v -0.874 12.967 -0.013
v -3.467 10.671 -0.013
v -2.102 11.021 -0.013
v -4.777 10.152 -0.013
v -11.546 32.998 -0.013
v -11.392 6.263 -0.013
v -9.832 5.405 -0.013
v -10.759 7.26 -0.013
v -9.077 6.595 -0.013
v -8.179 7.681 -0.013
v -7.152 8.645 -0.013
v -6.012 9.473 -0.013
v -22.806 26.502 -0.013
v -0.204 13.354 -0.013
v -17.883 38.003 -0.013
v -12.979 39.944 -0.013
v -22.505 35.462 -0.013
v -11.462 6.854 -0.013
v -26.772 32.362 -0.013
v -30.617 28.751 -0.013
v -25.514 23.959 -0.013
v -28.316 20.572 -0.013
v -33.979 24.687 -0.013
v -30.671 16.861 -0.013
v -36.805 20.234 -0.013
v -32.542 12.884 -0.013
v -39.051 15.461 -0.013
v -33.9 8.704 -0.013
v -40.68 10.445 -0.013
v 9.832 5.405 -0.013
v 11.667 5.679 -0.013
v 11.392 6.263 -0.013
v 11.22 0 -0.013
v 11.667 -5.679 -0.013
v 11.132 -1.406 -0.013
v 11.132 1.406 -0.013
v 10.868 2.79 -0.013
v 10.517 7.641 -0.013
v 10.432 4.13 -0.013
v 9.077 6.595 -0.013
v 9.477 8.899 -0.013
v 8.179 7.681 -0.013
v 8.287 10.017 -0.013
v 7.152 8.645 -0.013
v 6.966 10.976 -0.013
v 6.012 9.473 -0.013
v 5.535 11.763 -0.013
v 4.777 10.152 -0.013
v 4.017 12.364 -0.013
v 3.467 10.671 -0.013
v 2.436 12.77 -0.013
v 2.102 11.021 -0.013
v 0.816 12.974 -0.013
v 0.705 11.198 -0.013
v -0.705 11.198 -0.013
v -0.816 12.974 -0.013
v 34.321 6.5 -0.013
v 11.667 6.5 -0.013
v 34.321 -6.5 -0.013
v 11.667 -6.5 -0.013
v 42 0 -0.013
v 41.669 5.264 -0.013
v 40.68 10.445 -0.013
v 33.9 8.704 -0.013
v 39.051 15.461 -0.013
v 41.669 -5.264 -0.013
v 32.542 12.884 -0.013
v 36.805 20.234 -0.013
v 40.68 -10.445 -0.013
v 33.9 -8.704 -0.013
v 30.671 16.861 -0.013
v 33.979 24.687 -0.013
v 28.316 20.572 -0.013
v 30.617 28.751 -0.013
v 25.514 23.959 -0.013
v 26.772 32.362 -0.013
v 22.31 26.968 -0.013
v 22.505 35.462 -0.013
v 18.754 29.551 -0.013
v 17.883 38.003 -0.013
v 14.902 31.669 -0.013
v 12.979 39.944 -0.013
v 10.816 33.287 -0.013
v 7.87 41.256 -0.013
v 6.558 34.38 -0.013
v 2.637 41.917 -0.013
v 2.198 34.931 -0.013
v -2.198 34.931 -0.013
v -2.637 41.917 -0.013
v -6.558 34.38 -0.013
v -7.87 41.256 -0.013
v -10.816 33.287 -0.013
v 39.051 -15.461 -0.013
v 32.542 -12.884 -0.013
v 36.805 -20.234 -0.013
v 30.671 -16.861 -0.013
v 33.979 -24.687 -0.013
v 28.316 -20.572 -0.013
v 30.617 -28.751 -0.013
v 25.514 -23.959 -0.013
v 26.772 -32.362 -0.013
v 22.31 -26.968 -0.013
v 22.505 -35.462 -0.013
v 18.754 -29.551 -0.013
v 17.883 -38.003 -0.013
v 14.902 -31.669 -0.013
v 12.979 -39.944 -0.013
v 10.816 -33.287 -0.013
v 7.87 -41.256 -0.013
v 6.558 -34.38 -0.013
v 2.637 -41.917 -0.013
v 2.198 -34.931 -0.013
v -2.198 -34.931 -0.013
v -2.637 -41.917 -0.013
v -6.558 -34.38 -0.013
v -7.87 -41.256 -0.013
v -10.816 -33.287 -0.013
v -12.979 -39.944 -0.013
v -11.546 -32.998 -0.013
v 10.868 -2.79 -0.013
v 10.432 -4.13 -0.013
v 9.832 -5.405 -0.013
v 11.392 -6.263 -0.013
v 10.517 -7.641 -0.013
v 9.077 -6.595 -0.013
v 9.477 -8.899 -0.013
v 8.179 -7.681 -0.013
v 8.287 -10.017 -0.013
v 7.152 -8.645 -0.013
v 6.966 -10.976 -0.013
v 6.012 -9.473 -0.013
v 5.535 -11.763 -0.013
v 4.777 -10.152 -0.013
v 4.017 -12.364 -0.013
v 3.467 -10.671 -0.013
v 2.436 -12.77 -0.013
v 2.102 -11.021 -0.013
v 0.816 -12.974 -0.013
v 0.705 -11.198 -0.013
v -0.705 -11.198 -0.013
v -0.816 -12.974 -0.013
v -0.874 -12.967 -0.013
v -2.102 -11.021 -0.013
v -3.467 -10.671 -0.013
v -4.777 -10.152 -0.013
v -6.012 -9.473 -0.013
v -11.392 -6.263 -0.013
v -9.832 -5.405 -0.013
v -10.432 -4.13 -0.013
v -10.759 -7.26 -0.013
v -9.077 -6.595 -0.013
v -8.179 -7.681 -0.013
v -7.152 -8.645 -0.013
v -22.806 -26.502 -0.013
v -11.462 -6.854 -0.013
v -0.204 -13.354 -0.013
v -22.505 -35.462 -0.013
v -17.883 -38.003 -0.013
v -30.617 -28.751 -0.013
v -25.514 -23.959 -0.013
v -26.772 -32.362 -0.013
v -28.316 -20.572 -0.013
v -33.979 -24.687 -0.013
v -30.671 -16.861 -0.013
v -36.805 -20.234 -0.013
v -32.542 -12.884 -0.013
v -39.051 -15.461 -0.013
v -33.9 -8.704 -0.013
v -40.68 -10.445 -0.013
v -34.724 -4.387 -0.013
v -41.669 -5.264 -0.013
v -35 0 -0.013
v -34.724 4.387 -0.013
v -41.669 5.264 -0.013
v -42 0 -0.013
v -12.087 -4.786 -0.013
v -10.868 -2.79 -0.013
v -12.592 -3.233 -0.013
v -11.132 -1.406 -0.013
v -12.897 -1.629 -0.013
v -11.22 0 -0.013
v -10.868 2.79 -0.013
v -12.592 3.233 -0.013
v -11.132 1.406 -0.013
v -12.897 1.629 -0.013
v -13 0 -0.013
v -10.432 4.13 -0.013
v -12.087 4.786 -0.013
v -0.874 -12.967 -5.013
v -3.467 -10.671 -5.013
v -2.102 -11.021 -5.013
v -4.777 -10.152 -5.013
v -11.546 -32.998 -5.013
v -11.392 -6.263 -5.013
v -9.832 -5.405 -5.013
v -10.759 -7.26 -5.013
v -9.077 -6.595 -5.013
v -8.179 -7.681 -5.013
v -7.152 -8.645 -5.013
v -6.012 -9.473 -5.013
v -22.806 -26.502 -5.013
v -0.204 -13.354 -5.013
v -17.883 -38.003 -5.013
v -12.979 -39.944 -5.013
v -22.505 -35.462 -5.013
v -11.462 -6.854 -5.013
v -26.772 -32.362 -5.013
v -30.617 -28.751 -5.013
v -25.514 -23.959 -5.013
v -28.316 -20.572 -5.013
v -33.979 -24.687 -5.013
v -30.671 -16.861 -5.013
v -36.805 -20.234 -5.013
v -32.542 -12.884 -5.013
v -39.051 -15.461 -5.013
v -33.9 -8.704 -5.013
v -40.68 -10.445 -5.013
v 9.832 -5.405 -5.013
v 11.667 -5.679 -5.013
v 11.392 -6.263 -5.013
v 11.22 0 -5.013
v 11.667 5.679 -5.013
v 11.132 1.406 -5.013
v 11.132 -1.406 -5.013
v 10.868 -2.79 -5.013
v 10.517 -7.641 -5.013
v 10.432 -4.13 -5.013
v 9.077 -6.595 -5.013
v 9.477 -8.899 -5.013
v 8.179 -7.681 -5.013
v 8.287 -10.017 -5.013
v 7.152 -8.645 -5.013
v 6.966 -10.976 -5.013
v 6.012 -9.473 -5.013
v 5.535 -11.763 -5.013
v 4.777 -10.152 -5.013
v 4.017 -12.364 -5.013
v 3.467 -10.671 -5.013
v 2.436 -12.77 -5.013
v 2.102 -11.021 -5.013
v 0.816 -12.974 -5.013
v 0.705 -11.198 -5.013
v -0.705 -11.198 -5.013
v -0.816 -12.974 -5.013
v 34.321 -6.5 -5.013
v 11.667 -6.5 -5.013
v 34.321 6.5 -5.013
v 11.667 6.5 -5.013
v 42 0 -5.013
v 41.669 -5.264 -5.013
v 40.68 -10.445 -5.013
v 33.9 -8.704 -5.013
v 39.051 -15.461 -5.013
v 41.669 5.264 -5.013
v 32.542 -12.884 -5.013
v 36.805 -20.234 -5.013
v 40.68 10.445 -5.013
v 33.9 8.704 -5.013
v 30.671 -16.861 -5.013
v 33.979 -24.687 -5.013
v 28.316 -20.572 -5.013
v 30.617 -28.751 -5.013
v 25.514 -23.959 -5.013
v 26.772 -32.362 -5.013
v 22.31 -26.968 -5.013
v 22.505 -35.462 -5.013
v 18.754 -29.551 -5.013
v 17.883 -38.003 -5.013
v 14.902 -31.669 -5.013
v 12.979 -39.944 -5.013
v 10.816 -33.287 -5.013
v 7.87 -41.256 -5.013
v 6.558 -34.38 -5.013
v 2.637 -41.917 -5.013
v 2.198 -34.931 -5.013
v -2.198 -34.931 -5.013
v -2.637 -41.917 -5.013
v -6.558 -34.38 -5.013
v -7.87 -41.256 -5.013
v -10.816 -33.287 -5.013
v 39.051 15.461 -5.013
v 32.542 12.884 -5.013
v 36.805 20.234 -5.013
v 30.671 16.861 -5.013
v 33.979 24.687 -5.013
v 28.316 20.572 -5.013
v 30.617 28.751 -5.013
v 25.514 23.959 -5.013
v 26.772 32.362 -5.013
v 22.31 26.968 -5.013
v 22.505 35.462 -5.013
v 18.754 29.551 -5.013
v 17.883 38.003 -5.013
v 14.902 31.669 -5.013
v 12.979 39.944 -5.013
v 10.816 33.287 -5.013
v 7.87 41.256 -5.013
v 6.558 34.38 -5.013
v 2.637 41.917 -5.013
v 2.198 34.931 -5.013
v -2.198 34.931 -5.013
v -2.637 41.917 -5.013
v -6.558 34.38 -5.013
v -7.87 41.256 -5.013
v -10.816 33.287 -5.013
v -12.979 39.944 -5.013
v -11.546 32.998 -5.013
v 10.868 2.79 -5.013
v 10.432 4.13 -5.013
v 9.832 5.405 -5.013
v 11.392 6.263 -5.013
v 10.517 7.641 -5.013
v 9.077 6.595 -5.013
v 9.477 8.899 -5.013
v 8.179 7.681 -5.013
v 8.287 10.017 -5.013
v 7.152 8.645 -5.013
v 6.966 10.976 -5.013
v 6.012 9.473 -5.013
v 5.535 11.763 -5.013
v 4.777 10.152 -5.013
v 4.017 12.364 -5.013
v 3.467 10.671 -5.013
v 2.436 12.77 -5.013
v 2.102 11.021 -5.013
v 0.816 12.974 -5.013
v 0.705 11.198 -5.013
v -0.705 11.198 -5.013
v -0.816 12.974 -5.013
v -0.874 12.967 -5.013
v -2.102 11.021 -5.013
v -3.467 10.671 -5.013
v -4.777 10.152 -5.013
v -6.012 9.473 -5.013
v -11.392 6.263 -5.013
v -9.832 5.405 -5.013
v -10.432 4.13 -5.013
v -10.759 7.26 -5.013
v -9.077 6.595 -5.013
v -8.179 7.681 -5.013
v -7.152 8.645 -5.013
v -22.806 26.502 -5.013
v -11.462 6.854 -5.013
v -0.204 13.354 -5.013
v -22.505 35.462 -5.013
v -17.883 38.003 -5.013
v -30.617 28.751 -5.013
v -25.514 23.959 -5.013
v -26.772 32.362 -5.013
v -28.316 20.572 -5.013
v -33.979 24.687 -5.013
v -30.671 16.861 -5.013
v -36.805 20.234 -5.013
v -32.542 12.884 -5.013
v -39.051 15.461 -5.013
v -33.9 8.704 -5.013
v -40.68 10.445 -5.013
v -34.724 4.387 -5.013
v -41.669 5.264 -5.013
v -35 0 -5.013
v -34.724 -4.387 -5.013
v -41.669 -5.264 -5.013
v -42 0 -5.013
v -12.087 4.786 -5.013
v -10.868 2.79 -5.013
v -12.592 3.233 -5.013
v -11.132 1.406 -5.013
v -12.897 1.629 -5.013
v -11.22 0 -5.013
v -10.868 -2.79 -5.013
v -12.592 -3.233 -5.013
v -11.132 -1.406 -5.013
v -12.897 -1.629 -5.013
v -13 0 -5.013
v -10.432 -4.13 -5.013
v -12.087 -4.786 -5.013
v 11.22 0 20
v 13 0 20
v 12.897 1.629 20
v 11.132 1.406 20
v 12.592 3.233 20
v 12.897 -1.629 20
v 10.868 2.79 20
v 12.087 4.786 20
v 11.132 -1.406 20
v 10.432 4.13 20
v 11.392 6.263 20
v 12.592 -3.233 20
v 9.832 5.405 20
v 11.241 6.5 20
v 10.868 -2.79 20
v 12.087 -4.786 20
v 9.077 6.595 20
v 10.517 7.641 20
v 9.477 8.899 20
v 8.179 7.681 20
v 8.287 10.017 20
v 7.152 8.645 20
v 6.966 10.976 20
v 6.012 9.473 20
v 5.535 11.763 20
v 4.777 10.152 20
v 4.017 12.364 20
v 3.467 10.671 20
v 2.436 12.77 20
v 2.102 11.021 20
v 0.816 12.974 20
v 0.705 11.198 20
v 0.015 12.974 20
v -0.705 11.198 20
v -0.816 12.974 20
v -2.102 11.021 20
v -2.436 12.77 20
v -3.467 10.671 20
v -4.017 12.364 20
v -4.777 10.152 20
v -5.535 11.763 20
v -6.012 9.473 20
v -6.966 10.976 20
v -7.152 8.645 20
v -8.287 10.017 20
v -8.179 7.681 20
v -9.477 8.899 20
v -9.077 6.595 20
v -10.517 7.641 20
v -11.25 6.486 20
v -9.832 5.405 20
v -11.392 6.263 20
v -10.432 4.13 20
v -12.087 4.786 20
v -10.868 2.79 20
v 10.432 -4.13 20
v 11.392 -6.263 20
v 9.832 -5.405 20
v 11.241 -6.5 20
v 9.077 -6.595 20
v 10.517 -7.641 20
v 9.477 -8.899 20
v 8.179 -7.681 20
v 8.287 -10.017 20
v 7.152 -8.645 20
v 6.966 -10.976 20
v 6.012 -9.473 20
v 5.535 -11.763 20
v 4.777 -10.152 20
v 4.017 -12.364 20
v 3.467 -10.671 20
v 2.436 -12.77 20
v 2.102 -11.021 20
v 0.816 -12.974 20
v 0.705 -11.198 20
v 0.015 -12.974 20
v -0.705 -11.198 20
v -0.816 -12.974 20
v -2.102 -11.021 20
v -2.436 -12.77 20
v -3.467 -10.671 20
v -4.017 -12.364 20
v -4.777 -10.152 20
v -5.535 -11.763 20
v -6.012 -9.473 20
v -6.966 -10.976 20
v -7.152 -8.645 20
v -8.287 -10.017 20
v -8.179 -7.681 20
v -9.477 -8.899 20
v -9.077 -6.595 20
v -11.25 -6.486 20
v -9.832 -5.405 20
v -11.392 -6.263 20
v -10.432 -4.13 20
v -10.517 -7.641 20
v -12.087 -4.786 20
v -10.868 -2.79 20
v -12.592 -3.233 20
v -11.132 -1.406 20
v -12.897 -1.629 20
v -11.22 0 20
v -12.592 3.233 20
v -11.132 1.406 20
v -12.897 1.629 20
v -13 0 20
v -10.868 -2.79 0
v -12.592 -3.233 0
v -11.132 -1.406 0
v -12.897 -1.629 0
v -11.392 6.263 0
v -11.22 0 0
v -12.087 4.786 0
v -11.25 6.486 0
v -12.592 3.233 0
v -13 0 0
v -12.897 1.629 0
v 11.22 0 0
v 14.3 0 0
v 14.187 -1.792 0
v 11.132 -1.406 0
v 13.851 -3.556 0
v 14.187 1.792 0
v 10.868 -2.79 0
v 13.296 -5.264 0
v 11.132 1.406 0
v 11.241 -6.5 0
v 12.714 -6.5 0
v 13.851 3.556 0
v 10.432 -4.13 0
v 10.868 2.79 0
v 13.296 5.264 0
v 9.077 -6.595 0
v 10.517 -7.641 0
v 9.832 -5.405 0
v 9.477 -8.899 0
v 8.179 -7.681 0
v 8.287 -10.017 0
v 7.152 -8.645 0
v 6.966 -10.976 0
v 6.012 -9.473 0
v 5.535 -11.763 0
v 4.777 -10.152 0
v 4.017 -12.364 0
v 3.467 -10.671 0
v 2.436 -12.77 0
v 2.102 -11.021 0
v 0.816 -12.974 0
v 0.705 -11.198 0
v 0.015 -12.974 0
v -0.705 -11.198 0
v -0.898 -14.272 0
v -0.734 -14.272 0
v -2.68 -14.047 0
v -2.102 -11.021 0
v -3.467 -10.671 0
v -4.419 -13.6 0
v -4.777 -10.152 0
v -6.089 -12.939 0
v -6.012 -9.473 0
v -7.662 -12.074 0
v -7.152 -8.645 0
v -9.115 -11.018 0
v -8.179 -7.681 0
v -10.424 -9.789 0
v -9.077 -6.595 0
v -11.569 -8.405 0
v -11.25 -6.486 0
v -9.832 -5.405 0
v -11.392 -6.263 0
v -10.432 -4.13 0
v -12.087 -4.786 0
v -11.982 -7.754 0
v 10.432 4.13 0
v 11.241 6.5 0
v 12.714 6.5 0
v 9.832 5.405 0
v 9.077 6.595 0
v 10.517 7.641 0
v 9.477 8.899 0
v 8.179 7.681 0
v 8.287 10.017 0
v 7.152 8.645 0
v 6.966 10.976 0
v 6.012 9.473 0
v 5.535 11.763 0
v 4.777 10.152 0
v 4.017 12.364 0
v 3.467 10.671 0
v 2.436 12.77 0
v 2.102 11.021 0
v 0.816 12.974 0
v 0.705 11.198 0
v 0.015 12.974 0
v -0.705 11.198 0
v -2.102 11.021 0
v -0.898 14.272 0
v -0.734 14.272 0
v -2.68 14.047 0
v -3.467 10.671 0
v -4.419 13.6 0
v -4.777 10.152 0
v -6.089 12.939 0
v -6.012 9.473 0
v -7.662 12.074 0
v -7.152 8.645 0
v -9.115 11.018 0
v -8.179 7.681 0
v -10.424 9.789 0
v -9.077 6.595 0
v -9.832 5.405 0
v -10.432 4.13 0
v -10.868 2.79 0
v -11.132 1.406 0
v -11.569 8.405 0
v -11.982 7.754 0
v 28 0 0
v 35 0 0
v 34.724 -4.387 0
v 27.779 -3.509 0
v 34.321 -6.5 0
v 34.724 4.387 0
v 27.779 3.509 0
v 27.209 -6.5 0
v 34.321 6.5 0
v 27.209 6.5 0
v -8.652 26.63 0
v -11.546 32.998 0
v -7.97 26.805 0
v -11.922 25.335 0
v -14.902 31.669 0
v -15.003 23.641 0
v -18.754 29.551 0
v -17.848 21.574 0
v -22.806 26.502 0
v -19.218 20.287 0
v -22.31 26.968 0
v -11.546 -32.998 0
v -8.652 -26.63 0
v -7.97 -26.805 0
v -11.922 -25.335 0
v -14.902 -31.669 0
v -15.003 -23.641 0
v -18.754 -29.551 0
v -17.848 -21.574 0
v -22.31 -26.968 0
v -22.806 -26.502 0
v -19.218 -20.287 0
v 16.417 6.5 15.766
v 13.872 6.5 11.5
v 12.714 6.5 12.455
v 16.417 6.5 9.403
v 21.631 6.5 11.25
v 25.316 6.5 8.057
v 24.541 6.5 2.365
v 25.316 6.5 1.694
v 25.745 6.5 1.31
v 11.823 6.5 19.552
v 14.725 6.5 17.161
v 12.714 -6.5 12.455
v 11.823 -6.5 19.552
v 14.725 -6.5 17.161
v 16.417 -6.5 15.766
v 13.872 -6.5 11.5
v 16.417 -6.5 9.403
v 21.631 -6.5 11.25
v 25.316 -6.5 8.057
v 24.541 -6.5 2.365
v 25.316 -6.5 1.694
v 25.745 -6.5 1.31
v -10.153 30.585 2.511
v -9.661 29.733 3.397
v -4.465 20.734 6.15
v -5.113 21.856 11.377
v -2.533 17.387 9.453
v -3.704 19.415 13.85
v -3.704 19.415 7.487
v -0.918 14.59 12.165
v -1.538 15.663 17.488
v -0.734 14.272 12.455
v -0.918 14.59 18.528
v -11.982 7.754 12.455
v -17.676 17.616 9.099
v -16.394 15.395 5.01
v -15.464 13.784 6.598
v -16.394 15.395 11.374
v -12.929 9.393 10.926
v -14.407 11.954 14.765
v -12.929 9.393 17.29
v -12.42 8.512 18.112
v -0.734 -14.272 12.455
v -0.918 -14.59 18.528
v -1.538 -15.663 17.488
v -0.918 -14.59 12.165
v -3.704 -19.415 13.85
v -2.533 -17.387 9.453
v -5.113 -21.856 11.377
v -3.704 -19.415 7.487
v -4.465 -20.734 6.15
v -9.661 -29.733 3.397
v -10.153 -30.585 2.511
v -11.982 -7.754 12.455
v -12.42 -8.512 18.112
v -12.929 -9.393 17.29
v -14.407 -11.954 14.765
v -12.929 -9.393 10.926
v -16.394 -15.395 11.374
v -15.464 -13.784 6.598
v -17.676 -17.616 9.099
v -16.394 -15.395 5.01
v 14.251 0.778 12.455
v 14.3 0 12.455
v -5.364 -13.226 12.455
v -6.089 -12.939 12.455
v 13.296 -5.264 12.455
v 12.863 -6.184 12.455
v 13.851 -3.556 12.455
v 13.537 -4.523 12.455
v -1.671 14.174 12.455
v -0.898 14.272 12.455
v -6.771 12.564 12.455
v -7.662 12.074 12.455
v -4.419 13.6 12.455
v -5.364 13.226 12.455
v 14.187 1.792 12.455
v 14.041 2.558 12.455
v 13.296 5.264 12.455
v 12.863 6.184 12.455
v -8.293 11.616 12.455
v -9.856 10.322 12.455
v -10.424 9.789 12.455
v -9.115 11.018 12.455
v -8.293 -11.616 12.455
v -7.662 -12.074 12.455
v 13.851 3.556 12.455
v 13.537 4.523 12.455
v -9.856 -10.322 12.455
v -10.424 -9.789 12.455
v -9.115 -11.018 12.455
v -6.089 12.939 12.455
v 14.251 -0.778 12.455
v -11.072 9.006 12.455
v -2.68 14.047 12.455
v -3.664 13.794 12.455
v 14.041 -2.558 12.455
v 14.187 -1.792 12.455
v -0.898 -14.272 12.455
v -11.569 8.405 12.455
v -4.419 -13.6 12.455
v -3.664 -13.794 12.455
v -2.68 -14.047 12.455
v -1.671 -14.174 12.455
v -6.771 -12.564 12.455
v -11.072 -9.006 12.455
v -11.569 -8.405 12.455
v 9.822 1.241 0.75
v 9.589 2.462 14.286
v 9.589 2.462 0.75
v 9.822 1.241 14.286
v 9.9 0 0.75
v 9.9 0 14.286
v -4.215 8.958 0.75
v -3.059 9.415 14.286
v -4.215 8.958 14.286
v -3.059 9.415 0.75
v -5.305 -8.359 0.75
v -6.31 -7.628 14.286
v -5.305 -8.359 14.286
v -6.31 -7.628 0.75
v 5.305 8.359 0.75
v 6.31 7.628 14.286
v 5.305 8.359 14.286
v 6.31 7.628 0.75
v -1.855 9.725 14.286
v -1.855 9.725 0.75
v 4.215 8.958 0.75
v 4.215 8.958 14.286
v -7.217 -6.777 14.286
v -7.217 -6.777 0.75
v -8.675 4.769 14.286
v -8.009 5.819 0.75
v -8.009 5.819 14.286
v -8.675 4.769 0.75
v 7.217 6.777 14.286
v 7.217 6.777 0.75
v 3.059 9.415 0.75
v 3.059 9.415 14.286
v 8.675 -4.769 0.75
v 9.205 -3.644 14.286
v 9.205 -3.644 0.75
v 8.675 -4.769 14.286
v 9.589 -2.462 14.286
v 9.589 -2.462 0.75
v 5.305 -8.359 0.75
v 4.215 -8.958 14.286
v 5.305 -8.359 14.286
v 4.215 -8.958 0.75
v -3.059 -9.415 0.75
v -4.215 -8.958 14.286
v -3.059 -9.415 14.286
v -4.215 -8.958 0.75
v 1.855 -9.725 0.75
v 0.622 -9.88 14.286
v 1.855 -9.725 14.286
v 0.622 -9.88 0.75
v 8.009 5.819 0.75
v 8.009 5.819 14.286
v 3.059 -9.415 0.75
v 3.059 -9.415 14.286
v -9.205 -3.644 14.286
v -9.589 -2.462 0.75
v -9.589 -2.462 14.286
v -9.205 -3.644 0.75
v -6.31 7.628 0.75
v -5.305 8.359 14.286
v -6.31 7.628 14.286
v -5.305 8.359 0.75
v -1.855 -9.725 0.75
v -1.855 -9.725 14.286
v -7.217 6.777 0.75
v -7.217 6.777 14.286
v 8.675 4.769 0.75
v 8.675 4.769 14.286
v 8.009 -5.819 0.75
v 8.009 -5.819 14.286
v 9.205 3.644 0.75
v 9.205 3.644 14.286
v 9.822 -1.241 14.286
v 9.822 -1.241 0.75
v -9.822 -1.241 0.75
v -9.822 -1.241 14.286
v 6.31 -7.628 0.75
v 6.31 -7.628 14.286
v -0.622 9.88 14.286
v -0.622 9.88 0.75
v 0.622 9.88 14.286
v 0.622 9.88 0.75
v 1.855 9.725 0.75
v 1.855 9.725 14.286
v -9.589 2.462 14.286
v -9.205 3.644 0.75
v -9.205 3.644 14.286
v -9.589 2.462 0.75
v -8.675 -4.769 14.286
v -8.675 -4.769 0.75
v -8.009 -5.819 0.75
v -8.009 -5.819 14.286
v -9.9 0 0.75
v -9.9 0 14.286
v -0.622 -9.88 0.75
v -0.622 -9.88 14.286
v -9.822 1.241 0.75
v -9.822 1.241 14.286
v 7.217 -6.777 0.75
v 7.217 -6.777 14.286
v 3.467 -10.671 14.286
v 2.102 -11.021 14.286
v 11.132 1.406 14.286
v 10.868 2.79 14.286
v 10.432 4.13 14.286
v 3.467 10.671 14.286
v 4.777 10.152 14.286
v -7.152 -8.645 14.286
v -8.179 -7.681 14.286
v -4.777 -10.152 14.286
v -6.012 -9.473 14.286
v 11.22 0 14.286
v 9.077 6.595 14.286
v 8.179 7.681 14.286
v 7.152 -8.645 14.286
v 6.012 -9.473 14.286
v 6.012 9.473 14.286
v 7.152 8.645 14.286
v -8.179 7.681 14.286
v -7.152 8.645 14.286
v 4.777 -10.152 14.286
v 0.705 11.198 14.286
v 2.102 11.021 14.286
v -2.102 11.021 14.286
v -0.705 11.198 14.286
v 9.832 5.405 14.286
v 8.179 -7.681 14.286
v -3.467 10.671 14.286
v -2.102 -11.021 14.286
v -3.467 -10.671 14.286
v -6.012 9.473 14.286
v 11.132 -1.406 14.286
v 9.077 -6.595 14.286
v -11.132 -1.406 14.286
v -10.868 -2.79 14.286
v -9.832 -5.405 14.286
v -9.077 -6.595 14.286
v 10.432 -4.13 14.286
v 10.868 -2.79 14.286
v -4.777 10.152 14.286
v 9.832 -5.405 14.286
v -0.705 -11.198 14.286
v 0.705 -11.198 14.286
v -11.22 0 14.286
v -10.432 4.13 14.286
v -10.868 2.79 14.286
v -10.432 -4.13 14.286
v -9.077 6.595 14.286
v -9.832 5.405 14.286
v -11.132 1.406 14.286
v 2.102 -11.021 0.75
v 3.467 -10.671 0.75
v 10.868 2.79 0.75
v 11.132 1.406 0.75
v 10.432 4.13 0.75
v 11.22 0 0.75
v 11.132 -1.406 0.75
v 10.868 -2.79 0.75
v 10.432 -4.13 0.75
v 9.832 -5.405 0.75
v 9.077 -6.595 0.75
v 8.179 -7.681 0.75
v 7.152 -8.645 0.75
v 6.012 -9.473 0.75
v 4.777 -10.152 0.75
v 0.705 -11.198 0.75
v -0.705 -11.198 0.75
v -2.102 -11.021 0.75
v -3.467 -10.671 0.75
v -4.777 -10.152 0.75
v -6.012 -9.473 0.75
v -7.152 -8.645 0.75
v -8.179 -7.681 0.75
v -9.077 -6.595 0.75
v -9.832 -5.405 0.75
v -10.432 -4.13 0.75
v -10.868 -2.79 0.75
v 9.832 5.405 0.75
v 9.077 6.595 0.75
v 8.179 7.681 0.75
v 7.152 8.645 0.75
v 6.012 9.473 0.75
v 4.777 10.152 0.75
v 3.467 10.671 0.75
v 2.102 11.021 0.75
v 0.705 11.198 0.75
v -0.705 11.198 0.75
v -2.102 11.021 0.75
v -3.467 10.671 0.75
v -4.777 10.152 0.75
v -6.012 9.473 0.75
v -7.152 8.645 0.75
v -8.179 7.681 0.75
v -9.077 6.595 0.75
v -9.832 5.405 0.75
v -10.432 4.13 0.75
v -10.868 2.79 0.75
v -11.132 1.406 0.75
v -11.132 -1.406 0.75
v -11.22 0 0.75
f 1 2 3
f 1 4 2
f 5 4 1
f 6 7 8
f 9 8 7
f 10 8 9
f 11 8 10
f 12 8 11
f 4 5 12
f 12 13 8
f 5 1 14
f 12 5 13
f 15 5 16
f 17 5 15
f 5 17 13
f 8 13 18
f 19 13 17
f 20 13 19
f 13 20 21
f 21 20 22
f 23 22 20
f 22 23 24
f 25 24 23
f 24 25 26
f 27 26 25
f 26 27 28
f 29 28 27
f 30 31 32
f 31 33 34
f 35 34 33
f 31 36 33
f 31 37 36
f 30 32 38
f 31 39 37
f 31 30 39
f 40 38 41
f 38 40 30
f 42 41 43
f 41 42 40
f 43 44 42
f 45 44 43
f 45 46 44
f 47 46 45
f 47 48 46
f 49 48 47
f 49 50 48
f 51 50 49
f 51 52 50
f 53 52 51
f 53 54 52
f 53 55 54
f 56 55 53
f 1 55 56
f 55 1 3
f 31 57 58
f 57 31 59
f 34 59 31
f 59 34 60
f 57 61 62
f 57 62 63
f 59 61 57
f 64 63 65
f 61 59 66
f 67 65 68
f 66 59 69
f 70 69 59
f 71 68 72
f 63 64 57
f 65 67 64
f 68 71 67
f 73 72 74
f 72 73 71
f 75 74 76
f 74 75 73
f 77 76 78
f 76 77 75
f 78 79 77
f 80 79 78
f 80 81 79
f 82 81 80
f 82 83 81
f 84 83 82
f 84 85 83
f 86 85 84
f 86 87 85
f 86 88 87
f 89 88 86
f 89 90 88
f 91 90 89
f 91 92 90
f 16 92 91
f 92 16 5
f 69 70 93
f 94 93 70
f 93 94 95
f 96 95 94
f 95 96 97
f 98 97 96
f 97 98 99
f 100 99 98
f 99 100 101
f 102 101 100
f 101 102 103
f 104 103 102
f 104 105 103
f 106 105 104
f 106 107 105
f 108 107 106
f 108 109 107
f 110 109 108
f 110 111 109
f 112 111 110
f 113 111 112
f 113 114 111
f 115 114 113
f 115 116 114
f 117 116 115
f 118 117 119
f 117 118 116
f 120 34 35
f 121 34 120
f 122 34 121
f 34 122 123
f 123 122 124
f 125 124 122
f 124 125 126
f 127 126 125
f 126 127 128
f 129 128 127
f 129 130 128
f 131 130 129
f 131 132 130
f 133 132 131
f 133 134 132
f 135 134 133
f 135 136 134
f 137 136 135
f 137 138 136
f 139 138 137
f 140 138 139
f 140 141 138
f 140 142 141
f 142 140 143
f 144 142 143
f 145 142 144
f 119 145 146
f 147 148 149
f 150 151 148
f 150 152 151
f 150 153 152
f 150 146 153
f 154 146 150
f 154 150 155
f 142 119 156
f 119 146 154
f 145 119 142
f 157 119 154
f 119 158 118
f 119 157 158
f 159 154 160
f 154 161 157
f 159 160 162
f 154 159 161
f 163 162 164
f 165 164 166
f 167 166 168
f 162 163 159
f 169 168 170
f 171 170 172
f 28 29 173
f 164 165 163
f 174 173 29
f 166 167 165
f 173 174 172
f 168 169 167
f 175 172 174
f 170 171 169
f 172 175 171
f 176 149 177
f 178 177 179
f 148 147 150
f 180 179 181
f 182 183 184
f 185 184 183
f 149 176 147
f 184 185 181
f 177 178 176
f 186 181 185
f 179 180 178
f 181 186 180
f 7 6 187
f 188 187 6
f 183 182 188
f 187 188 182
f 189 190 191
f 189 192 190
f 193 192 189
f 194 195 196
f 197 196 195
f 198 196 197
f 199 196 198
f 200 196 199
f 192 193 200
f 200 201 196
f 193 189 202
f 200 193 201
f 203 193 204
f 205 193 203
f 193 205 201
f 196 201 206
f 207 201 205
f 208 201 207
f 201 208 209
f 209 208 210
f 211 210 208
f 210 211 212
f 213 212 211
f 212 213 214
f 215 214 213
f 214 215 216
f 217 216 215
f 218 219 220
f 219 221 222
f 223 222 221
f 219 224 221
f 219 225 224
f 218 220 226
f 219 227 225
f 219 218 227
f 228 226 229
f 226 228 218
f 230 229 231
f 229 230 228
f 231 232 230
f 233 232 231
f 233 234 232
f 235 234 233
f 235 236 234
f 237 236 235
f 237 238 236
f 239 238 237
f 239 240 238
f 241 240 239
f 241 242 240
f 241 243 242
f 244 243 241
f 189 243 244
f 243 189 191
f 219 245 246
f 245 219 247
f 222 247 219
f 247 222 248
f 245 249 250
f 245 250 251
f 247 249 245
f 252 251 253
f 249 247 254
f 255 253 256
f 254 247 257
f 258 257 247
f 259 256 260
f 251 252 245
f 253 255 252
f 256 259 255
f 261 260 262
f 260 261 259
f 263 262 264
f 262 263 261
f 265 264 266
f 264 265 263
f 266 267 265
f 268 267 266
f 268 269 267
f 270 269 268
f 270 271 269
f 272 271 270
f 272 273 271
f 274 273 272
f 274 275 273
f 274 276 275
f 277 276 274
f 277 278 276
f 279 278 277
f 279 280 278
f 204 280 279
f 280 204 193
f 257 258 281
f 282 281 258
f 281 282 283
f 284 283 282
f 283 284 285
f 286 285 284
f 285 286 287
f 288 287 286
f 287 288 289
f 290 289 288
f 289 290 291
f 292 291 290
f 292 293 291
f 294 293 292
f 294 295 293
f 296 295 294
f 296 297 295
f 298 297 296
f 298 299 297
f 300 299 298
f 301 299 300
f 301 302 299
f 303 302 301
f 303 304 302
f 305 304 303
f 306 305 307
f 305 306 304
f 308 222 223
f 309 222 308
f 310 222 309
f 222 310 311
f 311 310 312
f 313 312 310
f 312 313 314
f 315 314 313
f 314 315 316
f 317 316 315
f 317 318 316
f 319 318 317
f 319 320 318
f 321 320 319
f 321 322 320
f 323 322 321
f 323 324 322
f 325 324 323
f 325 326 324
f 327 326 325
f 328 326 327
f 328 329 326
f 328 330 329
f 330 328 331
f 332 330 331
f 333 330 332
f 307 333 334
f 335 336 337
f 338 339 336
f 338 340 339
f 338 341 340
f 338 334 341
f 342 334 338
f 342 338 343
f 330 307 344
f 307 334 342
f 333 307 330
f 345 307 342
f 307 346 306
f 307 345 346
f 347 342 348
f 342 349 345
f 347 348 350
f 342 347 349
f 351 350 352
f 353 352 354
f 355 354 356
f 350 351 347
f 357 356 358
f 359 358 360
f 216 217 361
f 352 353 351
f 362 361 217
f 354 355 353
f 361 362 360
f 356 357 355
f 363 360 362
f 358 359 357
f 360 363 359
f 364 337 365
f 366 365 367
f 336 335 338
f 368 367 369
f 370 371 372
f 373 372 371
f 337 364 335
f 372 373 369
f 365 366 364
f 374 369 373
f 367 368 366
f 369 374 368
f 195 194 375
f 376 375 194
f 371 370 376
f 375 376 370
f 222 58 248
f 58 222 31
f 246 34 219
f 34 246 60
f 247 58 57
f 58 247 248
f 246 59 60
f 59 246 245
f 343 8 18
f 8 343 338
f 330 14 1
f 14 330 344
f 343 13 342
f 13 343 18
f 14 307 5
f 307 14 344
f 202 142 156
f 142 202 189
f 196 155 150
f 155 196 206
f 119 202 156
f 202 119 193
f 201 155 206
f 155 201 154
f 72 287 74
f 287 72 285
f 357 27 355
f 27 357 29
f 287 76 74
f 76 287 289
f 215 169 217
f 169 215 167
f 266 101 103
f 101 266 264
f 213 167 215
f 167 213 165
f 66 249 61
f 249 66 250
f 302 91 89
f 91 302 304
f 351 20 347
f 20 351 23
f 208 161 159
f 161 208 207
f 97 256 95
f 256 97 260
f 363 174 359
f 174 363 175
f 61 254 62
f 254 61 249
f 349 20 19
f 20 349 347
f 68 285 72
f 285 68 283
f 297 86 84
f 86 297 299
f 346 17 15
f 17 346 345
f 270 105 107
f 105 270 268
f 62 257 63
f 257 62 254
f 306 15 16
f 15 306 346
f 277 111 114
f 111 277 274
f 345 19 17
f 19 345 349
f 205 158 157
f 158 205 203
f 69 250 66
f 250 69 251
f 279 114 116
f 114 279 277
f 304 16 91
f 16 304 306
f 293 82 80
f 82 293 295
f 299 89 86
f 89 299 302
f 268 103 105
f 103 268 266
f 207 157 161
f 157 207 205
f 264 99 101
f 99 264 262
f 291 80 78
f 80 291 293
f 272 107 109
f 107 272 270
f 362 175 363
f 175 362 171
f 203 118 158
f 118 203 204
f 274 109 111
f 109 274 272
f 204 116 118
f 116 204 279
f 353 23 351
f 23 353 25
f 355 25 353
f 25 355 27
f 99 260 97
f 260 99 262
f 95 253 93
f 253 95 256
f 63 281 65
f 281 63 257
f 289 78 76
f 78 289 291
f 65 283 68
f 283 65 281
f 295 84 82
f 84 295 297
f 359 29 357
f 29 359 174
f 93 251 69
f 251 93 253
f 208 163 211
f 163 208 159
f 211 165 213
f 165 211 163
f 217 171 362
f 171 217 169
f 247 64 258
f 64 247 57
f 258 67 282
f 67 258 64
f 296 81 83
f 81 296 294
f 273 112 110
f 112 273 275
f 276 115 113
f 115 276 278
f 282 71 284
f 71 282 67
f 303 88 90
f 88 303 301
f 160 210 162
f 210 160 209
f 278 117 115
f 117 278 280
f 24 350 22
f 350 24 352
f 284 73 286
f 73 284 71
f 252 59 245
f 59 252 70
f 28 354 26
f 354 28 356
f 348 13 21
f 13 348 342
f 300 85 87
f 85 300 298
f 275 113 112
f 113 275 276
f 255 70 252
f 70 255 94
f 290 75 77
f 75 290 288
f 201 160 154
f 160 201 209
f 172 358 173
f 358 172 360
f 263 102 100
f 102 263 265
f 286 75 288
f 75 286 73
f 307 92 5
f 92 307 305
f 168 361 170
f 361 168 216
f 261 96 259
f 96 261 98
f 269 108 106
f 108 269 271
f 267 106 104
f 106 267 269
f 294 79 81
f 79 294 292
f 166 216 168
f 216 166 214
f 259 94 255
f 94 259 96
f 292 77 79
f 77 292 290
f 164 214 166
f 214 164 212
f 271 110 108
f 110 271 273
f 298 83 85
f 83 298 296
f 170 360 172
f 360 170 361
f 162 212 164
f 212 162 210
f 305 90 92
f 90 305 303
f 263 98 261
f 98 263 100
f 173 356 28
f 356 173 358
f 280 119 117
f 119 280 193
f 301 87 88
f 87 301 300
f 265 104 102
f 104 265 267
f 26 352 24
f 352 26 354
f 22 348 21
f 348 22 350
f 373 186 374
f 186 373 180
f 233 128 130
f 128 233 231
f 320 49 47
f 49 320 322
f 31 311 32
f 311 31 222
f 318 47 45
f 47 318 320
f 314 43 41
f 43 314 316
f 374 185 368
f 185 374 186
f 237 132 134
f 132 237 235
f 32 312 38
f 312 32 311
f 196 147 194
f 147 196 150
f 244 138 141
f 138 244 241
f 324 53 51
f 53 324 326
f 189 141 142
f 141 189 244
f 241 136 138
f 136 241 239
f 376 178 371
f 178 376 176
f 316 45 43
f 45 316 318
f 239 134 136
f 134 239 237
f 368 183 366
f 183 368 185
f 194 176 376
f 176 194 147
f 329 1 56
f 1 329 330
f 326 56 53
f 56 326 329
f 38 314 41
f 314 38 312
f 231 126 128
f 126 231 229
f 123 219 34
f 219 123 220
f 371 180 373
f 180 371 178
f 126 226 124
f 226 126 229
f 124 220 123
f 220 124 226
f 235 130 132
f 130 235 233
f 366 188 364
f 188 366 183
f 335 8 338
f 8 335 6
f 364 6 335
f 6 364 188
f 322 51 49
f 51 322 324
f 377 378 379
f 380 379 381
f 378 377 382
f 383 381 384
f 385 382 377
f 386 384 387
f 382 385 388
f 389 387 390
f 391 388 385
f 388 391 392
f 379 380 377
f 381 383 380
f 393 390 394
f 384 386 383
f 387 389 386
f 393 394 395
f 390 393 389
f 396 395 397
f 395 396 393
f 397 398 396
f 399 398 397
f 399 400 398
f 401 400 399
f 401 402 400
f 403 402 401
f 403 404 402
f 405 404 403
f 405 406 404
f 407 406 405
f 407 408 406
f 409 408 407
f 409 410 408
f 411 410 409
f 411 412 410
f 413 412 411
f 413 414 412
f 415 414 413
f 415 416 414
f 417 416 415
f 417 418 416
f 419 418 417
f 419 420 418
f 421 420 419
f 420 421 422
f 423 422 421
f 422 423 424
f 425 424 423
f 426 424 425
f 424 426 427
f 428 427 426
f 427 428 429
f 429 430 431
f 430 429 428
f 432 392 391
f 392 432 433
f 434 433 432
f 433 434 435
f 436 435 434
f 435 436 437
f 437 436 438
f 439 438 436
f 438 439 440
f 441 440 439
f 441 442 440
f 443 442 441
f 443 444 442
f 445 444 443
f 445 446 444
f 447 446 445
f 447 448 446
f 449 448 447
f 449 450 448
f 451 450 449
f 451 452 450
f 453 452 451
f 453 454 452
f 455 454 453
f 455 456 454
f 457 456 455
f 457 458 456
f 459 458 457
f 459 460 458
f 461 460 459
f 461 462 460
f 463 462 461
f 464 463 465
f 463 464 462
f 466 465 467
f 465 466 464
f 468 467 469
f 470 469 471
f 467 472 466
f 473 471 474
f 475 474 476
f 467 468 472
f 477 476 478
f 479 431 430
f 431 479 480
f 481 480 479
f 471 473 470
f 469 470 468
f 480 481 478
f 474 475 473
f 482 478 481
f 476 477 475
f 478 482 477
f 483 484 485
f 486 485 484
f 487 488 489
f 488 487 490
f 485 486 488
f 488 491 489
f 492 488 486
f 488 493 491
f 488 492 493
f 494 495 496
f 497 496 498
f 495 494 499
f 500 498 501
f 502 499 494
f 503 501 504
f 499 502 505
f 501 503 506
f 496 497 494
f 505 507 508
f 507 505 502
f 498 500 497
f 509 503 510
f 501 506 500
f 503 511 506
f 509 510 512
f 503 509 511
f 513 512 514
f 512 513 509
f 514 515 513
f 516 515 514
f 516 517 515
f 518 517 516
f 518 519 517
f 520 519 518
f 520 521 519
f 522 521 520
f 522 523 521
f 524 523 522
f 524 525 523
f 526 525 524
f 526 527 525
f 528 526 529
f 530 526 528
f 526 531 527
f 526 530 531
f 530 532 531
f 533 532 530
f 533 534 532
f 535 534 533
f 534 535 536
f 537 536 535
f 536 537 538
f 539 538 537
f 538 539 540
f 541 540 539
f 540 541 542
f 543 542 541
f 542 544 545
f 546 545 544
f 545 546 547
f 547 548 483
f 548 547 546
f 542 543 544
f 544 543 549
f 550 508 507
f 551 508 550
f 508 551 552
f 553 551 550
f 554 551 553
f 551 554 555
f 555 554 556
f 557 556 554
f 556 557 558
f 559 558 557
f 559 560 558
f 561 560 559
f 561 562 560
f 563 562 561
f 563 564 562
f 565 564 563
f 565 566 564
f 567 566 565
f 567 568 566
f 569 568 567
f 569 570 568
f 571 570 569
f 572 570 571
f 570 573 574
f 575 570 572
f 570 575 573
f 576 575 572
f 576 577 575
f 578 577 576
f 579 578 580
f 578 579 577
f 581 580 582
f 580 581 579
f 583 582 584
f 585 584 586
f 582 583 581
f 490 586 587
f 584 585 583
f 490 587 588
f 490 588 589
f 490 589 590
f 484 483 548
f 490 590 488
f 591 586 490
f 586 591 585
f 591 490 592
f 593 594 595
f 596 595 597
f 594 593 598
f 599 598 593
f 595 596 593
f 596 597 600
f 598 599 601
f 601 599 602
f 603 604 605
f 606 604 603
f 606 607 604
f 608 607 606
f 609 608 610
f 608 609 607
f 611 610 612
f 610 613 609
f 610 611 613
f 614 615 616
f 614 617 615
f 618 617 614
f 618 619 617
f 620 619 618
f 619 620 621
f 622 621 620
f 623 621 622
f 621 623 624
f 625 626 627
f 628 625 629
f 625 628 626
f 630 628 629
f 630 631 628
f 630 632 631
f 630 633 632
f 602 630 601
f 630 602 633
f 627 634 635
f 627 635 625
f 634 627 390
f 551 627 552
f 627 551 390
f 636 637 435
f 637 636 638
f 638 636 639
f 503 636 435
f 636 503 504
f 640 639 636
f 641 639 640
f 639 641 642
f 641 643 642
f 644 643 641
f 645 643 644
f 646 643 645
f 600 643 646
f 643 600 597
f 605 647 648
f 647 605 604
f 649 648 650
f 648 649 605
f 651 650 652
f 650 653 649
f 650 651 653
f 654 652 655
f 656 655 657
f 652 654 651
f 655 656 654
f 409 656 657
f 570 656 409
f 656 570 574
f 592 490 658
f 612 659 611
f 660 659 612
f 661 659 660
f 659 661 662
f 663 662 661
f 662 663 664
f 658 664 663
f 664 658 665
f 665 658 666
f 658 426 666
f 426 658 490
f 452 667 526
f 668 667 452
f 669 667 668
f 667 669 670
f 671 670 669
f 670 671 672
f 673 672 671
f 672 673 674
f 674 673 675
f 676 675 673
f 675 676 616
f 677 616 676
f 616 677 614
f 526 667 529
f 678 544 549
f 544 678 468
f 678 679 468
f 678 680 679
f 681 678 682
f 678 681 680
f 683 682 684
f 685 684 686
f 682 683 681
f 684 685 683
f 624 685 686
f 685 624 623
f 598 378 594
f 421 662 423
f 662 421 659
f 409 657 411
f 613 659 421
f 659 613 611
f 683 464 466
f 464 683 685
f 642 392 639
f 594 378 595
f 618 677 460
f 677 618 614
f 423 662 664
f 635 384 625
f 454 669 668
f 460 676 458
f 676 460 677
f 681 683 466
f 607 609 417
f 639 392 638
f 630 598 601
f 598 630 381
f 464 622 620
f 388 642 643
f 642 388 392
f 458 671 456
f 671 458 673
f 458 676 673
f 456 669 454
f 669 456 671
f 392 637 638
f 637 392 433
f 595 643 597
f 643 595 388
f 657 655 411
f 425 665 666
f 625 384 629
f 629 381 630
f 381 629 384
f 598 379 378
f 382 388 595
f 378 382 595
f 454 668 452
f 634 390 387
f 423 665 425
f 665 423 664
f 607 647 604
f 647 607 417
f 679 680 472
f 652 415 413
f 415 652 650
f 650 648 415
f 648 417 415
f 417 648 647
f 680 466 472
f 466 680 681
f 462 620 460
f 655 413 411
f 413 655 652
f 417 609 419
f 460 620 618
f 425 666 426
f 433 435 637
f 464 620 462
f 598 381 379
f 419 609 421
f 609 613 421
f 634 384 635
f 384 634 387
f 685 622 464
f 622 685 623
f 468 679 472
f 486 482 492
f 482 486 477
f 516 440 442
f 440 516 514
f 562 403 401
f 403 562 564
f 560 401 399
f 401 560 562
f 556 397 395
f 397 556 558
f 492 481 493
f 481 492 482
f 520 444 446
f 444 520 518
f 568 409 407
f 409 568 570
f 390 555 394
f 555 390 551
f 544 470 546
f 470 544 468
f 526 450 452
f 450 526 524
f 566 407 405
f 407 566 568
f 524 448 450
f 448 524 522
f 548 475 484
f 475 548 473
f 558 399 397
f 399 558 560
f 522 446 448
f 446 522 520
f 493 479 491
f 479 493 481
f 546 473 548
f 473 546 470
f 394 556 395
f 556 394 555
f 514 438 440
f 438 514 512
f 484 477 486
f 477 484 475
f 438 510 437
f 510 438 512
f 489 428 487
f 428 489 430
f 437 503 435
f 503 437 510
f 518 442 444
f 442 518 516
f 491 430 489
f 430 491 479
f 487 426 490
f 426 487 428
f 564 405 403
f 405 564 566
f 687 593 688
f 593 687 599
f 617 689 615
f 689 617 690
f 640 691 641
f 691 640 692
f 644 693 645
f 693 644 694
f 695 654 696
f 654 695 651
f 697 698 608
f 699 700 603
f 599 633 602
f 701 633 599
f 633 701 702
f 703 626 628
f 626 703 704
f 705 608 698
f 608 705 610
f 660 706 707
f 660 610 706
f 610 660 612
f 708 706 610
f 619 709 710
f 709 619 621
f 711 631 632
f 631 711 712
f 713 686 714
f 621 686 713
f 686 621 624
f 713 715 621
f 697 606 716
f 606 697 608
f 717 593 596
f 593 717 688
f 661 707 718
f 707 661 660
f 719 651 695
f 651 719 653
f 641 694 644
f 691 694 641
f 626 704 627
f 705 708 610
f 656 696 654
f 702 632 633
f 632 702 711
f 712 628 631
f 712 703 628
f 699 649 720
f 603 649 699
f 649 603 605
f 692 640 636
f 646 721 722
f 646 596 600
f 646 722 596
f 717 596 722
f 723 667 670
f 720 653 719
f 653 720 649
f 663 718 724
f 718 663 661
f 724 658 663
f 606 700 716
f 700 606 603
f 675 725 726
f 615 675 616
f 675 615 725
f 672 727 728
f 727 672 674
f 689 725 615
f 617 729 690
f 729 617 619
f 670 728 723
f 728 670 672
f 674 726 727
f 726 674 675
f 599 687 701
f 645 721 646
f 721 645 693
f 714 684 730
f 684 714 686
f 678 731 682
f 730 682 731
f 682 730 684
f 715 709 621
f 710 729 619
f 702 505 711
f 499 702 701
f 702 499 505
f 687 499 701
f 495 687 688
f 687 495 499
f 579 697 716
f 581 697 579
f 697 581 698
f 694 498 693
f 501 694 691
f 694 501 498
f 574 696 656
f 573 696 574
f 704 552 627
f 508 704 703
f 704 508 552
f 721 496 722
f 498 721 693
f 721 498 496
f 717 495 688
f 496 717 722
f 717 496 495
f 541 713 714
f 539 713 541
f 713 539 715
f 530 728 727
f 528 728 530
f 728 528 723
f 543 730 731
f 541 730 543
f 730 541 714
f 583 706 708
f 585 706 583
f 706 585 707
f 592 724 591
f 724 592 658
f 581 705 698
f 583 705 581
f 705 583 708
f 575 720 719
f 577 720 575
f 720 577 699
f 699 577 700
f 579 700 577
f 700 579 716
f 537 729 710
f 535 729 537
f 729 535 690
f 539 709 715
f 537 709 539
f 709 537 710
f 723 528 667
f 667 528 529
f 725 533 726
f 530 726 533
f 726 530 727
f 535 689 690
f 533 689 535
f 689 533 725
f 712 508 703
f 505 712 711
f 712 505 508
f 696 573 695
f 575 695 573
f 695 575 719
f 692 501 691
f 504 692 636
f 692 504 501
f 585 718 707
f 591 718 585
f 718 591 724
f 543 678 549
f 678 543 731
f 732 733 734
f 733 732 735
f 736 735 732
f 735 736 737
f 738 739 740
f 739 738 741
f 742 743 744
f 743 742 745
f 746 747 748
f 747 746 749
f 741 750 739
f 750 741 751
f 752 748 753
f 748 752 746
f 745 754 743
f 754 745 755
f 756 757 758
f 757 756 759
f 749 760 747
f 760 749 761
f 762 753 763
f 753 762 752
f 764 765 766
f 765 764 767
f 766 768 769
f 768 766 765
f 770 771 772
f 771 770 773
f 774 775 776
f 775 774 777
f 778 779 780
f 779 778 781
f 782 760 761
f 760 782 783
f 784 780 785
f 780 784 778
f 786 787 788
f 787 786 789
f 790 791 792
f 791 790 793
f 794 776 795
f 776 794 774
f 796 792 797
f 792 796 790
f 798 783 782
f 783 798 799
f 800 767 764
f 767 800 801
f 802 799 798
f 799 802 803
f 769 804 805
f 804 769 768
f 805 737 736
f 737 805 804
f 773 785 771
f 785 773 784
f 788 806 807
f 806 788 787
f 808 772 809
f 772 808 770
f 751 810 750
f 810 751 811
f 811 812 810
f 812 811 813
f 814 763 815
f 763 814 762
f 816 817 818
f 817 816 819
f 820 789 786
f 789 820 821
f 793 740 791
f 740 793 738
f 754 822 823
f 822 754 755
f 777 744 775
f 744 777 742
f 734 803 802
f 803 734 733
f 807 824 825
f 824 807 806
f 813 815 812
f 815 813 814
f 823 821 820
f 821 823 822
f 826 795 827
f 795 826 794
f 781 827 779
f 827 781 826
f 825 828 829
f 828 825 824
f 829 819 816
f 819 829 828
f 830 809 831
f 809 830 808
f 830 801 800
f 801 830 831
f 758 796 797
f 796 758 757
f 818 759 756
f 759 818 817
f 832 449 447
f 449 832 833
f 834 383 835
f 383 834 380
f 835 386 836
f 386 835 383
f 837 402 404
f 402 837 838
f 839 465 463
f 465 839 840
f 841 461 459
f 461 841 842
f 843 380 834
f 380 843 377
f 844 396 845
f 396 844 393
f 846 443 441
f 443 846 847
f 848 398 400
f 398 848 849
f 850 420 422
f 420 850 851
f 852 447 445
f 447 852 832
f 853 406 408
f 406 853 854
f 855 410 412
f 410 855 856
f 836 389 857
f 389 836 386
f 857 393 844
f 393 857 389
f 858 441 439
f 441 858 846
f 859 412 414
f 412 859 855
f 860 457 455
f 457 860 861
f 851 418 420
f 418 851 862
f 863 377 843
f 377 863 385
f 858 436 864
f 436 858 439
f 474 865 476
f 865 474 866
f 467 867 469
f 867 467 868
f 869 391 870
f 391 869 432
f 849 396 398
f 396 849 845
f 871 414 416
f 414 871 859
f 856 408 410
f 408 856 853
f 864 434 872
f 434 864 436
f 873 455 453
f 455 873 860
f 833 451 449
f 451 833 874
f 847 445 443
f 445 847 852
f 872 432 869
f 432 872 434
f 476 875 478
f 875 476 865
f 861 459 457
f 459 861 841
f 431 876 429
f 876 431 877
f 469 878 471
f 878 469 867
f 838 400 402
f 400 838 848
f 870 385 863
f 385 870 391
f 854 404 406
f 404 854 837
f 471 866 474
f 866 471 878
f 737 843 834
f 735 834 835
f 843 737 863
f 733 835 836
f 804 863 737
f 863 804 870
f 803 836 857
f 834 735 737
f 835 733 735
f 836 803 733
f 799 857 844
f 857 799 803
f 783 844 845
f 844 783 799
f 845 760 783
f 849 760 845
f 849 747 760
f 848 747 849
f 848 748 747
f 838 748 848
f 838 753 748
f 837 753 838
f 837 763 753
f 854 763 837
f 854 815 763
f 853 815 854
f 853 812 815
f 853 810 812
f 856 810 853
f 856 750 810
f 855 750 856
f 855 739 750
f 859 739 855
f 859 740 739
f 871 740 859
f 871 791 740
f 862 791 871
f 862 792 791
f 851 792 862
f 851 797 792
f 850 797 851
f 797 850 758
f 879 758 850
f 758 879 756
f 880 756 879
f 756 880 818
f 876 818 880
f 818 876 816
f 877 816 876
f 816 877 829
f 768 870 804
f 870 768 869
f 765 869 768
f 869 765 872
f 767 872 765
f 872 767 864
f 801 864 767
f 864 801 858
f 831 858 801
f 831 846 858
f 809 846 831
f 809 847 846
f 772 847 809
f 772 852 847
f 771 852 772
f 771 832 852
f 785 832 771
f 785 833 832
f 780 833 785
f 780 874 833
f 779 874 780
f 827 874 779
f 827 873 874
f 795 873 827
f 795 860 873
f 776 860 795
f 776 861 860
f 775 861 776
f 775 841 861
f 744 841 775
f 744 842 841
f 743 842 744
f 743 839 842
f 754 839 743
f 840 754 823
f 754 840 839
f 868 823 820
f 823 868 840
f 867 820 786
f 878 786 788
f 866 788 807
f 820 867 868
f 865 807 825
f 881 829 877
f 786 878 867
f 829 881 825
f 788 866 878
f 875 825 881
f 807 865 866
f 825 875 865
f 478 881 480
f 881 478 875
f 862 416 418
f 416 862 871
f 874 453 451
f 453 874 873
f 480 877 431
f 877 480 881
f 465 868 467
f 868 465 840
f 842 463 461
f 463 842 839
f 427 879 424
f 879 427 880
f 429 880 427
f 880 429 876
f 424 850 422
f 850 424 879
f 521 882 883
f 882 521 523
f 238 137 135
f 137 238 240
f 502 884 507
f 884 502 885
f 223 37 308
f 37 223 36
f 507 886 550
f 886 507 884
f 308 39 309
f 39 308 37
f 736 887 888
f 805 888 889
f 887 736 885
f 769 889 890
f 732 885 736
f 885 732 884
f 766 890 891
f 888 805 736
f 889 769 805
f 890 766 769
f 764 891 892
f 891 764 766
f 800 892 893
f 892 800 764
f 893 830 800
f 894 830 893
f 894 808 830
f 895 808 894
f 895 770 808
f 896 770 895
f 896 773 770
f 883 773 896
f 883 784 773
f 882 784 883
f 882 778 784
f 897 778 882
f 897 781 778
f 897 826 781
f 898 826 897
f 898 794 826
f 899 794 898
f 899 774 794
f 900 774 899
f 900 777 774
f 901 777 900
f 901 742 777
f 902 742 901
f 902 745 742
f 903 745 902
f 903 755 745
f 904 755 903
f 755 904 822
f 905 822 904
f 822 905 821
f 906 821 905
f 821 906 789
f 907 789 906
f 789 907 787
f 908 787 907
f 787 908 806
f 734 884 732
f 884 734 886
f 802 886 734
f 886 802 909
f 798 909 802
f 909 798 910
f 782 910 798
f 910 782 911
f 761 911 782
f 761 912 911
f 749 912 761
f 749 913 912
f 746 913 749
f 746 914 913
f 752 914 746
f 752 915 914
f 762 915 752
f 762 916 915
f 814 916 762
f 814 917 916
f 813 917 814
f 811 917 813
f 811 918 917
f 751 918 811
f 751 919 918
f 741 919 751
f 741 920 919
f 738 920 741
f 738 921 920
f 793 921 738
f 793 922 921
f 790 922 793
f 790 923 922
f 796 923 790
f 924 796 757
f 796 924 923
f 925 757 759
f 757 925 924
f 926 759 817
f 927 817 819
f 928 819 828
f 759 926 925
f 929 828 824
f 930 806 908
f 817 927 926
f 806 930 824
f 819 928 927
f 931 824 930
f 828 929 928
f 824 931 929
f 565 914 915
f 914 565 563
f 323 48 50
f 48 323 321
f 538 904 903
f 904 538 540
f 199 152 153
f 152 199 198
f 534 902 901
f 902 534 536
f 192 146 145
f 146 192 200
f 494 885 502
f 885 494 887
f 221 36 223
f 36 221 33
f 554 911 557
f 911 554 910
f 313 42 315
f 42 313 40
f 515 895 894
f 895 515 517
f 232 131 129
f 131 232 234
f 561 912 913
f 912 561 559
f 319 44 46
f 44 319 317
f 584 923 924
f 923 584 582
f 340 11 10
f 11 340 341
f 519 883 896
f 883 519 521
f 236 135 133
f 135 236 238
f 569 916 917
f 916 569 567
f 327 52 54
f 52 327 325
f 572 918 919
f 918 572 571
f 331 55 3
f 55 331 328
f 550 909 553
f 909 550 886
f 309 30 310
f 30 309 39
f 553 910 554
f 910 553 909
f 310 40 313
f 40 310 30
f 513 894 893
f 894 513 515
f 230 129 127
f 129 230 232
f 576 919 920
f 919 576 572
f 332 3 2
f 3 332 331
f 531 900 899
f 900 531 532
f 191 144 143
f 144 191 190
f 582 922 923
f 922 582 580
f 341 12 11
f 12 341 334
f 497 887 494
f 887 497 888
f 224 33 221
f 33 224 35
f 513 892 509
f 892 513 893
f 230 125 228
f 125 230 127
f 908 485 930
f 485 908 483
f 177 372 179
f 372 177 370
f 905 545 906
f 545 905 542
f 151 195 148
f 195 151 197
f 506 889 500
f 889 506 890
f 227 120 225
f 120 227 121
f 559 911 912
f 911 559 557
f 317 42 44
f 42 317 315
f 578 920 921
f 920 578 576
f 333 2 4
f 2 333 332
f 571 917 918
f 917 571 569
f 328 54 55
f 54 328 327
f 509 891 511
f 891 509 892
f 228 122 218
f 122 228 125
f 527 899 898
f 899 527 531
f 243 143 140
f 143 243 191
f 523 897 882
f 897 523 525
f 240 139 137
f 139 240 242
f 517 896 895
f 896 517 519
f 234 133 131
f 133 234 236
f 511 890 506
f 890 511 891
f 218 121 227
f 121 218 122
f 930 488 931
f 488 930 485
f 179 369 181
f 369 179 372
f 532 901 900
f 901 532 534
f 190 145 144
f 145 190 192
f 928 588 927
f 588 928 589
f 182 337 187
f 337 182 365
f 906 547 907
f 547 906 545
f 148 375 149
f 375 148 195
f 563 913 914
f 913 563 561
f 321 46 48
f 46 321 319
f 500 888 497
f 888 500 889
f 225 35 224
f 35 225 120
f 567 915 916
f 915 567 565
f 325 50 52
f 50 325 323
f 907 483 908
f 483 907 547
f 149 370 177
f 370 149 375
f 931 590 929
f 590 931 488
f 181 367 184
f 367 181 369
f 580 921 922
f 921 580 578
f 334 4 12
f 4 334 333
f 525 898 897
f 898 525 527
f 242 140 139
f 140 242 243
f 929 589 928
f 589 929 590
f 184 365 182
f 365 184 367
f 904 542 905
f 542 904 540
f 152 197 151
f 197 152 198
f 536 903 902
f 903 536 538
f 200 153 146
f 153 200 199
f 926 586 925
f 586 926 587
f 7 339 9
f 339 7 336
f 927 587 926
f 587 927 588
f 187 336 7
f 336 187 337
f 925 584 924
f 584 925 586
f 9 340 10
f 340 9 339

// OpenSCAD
/* [filament spool dimensions] */

// filament spool minimum diameter
min_diameter=26;

// filament spool minimum diameter
max_diameter=70;

/* [spindle dimensions] */

// width of spindle
spindle_width=20;

// width of spindle collar
collar_width=5;

/* [Hidden] */

//rod_diameter=5/16*24.5;
rod_diameter=spindle_width-2;

$fn=50;
include <MCAD/bearing.scad>;

module base(){
	union(){
		difference(){
			union(){
				rotate([0,0,0])translate([max_diameter/2,0,0])cube([max_diameter/1.5,0.5*min_diameter,collar_width],center=true);
				rotate([0,0,120])translate([max_diameter/2,0,0])cube([max_diameter/1.5,0.5*min_diameter,collar_width],center=true);
				rotate([0,0,-120])translate([max_diameter/2,0,0])cube([max_diameter/1.5,0.5*min_diameter,collar_width],center=true);
			}
			difference(){
				cylinder(d=2*max_diameter,h=1.1*collar_width,center=true);
				cylinder(d=1.1*max_diameter,h=1.2*collar_width,center=true);
			}
		}
		cylinder(d=min_diameter,h=collar_width,center=true);
		difference(){
			cylinder(d=1.2*max_diameter,h=collar_width,center=true);
			cylinder(d=1*max_diameter,h=1.2*collar_width,center=true);
		}
	}
}

module core(){
		union(){
			cylinder(d=min_diameter,h=spindle_width,center=true);
			intersection(){
				cylinder(d1=max_diameter,d2=min_diameter,h=spindle_width,center=true);
				union(){
					rotate([0,0,0])translate([max_diameter/2,0,0])cube([max_diameter,0.5*min_diameter,spindle_width],center=true);
					rotate([0,0,120])translate([max_diameter/2,0,0])cube([max_diameter,0.5*min_diameter,spindle_width],center=true);
					rotate([0,0,-120])translate([max_diameter/2,0,0])cube([max_diameter,0.5*min_diameter,spindle_width],center=true);
				}
			}
		}
}

module spindle(){
	difference(){
		union(){
			translate([0,0,-(collar_width)/1.99])base();
			translate([0,0,(spindle_width)/2]){
				difference(){
					core();
					translate([0,0,-0.1*spindle_width])difference(){
						cylinder(d1=0.8*max_diameter,d2=0.8*min_diameter,h=0.8*spindle_width,center=true);
						cylinder(d=1.1*min_diameter,h=0.9*spindle_width,center=true);
					}
				}
			}
		}
		translate([0,0,(spindle_width-collar_width)/2])cylinder(d=0.9*bearingOuterDiameter(SkateBearing),h=1.2*(spindle_width+collar_width),center=true);
	}
}

difference(){
	spindle();
	scale([1.02,1.02,1])bearing(pos=[0,0,(spindle_width)/1.4], model=SkateBearing, outline=true);
	scale([1.02,1.02,1])bearing(pos=[0,0,-(collar_width)/0.8], model=SkateBearing, outline=true);
}

